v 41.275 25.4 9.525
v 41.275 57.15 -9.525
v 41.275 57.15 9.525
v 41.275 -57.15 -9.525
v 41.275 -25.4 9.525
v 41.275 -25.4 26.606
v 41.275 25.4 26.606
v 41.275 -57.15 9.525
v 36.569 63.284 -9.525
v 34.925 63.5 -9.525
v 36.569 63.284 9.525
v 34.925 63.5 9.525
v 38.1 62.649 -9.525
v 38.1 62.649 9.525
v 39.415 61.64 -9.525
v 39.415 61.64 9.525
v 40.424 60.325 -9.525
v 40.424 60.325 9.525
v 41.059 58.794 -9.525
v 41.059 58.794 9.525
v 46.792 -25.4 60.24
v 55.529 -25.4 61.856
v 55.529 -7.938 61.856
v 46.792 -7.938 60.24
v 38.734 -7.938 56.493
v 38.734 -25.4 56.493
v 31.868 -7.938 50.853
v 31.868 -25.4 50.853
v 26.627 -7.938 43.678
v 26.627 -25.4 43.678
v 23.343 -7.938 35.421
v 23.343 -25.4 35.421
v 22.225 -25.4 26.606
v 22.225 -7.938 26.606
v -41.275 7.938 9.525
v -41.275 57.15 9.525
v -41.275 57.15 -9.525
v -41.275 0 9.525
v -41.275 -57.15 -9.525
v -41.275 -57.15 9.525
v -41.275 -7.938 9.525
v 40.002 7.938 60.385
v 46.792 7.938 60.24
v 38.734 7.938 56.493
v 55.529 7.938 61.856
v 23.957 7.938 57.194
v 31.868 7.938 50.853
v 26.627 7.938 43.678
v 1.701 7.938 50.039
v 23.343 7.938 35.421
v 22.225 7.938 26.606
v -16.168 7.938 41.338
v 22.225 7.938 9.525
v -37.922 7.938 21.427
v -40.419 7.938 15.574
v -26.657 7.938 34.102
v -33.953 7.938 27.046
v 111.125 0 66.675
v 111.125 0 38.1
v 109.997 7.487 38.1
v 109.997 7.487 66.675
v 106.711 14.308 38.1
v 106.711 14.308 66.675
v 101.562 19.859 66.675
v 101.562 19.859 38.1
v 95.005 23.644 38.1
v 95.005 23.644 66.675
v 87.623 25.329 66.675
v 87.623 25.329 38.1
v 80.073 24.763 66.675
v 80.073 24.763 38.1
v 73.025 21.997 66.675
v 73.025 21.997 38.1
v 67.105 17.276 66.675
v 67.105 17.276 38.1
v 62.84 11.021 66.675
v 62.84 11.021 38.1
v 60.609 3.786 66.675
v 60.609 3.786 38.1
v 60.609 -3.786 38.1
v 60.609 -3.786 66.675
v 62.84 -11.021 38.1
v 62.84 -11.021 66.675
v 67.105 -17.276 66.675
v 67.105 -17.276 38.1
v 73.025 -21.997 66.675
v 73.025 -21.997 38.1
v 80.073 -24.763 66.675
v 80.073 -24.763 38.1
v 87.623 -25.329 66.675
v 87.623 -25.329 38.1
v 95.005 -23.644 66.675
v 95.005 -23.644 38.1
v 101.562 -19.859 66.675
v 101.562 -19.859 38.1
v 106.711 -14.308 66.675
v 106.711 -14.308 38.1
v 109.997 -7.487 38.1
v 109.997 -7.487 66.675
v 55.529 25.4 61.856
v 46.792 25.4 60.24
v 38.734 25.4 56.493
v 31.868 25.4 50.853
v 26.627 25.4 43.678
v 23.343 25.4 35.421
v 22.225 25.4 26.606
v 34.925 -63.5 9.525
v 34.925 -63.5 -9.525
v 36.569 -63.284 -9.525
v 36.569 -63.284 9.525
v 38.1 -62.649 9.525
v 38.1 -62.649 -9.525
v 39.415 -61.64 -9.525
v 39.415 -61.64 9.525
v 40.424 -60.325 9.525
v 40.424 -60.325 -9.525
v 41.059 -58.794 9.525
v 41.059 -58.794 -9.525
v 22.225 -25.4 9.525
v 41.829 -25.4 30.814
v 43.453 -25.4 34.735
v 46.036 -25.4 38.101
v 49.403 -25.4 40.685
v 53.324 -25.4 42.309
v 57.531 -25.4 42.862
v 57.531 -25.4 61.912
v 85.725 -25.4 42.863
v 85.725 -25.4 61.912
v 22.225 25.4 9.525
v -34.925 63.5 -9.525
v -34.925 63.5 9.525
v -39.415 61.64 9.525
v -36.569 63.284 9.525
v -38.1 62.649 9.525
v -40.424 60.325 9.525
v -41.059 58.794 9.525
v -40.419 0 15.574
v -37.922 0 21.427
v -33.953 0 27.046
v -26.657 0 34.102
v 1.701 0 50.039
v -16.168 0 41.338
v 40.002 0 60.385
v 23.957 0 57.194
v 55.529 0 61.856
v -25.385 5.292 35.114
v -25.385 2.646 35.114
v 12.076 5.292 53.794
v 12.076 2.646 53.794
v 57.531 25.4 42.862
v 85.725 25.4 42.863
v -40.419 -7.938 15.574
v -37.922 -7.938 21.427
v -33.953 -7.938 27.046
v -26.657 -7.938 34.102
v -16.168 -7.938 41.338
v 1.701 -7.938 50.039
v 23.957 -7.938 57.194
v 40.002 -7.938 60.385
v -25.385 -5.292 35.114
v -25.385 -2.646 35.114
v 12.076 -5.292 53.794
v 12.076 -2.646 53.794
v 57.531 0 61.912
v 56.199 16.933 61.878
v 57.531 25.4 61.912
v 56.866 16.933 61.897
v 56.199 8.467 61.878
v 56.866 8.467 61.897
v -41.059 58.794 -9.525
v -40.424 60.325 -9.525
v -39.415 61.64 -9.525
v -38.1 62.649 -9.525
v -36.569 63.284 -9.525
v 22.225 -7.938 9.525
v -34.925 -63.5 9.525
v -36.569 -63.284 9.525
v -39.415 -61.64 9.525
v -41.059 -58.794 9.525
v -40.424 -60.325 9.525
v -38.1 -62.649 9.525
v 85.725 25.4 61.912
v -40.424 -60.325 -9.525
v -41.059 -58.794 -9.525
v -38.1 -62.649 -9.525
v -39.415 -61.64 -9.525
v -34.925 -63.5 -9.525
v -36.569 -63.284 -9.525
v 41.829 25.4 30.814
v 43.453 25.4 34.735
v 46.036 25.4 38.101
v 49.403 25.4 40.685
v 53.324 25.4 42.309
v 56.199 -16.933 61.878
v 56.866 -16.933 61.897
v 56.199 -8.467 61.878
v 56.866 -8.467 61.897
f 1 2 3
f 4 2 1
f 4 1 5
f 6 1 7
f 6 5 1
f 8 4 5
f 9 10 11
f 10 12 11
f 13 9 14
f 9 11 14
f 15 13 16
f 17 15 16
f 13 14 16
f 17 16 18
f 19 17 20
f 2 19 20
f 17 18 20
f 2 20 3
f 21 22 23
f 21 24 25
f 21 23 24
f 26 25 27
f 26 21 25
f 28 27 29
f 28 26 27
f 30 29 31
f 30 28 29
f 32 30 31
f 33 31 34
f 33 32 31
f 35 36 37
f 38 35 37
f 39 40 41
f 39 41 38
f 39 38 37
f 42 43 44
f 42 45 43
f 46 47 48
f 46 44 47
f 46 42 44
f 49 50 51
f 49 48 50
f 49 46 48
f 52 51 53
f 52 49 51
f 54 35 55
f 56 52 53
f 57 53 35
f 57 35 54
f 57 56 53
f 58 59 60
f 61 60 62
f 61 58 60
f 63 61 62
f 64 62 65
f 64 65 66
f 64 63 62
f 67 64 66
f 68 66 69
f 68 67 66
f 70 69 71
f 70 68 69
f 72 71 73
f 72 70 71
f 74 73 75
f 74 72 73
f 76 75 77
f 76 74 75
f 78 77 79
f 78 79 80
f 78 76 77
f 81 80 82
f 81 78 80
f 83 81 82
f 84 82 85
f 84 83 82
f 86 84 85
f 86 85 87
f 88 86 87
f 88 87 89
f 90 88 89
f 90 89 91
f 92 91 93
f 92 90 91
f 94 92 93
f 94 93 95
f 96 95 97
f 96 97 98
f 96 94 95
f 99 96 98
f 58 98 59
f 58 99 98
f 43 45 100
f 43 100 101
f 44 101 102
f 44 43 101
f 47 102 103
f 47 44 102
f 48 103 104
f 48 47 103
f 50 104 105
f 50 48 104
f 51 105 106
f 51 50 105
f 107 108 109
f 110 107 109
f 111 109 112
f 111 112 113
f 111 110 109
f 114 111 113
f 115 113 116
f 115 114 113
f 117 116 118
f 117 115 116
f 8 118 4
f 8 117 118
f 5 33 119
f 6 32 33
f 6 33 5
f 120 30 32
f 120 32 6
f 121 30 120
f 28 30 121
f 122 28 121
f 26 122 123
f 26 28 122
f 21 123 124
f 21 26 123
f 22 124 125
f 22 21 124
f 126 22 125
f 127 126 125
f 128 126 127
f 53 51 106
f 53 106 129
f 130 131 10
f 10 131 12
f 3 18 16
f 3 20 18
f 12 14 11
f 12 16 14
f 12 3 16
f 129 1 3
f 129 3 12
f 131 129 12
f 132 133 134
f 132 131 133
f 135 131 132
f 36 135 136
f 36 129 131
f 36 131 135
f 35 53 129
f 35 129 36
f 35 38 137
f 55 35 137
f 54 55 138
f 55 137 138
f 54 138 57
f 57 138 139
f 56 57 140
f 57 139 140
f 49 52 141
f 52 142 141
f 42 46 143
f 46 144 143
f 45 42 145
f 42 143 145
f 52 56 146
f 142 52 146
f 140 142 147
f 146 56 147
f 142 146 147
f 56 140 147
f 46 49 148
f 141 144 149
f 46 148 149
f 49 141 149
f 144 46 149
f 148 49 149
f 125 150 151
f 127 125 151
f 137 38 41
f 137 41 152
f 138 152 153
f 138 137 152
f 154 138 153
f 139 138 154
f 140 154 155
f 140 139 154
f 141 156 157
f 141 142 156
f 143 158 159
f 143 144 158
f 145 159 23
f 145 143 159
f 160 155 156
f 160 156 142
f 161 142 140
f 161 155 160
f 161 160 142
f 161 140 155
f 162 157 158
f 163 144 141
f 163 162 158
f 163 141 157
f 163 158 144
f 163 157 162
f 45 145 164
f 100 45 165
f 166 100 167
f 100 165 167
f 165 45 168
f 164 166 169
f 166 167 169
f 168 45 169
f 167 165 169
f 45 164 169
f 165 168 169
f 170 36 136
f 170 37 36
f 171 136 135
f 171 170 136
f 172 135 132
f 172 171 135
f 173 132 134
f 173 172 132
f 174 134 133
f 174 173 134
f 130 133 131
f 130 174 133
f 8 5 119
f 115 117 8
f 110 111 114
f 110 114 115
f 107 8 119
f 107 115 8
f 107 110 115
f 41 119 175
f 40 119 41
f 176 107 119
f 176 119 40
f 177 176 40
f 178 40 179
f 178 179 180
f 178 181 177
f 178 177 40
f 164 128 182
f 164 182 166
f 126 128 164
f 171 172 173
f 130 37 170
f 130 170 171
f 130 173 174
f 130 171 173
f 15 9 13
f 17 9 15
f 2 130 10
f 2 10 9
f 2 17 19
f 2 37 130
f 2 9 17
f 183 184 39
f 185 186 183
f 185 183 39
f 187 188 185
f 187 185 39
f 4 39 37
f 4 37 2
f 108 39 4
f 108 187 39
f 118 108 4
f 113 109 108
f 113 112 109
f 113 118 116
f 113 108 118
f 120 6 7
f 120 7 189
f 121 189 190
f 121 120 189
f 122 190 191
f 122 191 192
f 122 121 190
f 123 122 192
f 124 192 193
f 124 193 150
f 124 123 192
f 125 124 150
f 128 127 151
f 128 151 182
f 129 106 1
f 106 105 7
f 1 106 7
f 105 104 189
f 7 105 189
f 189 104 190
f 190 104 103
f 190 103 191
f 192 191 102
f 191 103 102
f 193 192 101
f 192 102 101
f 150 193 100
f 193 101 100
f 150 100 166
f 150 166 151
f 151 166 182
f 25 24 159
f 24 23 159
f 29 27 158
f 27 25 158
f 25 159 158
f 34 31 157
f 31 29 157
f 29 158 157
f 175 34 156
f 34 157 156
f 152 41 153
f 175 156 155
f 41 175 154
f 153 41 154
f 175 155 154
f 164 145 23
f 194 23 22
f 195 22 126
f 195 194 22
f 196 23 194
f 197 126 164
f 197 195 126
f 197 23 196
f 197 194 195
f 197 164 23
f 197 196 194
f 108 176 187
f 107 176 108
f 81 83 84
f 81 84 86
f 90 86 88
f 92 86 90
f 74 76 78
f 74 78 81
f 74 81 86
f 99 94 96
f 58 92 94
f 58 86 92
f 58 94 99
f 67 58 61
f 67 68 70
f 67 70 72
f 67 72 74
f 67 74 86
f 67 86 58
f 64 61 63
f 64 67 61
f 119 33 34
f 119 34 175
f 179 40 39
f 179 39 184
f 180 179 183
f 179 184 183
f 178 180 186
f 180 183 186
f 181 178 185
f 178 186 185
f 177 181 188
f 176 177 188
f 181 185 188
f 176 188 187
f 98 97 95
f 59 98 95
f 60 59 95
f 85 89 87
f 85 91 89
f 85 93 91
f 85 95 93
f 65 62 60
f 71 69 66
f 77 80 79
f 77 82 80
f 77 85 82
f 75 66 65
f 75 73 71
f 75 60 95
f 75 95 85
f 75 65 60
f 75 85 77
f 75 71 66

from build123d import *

# Parameters (mm, degrees)
F1_DEPTH = 63.5
F0_W     = 25.4
F0_H     = 19.05
F2_DEPTH = 25.4
F3_DEPTH = 7.9375
F5_R     = 6.35


with BuildPart() as f1:
    # F0 (on Front) → F1 (new body, symmetric)
    with BuildSketch(Plane.XZ):
        Polygon((22.225, 9.525), (-41.275, 9.525), (-41.275, -9.525), (41.275, -9.525), (41.275, 9.525), align=None)
    extrude(amount=F1_DEPTH, both=True)

    # F0 (on Front) → F2 (join, symmetric)
    with BuildSketch(Plane.XZ):
        with BuildLine():
            Line((22.225, 26.6065), (22.225, 9.525))
            Line((22.225, 9.525), (41.275, 9.525))
            Line((41.275, 9.525), (41.275, 26.6065))
            ThreePointArc((41.275, 26.6065), (46.036272165, 38.101227835), (57.531, 42.8625))
            Line((57.531, 42.8625), (60.325, 42.8625))
            Line((60.325, 42.8625), (60.325, 61.9125))
            Line((60.325, 61.9125), (57.531, 61.9125))
            add(Edge.make_bspline(
                [(55.5290103021, 61.8556939376), (56.2002477906, 61.8803432694), (56.8676783397, 61.8993025972), (57.531, 61.9125)],
                knots=[110.0446061919, 110.0446061919, 110.0446061919, 110.0446061919, 111.8350383031, 111.8350383031, 111.8350383031, 111.8350383031], degree=3))
            ThreePointArc((55.5290103021, 61.8556939376), (31.8678368641, 50.8534728804), (22.225, 26.6065))
        make_face()
        with Locations((73.025, 52.3875)):
            Rectangle(F0_W, F0_H)
    extrude(amount=F2_DEPTH, both=True)

    # F0 (on Front) → F3 (join, symmetric)
    with BuildSketch(Plane.XZ):
        with BuildLine():
            add(Edge.make_bspline(
                [(-41.275, 9.525), (-41.3642752685, 37.3308218057), (14.273011468, 60.340682003), (55.5290103021, 61.8556939376)],
                knots=[0, 0, 0, 0, 110.0446061919, 110.0446061919, 110.0446061919, 110.0446061919], degree=3))
            Line((-41.275, 9.525), (22.225, 9.525))
            Line((22.225, 9.525), (22.225, 26.6065))
            ThreePointArc((22.225, 26.6065), (31.8678368641, 50.8534728804), (55.5290103021, 61.8556939376))
        make_face()
    extrude(amount=F3_DEPTH, both=True)

    # F5
    f5_edges = [f1.edges().sort_by_distance(p)[0] for p in [
        (-41.275, -63.5, 0),
        (41.275, -63.5, 0),
        (41.275, 63.5, 0),
        (-41.275, 63.5, 0),
    ]]
    fillet(f5_edges, radius=F5_R)


with BuildPart() as f4:
    # F0 (on Front) → F4 (revolve)
    with BuildSketch(Plane.XZ):
        Polygon((85.725, 66.675), (85.725, 61.9125), (85.725, 42.8625), (85.725, 38.1), (111.125, 38.1), (111.125, 66.675), align=None)
    revolve(axis=Axis((85.725, 0, 52.3875), (0, 0, 1)))


solid = Compound([f1.part, f4.part])
